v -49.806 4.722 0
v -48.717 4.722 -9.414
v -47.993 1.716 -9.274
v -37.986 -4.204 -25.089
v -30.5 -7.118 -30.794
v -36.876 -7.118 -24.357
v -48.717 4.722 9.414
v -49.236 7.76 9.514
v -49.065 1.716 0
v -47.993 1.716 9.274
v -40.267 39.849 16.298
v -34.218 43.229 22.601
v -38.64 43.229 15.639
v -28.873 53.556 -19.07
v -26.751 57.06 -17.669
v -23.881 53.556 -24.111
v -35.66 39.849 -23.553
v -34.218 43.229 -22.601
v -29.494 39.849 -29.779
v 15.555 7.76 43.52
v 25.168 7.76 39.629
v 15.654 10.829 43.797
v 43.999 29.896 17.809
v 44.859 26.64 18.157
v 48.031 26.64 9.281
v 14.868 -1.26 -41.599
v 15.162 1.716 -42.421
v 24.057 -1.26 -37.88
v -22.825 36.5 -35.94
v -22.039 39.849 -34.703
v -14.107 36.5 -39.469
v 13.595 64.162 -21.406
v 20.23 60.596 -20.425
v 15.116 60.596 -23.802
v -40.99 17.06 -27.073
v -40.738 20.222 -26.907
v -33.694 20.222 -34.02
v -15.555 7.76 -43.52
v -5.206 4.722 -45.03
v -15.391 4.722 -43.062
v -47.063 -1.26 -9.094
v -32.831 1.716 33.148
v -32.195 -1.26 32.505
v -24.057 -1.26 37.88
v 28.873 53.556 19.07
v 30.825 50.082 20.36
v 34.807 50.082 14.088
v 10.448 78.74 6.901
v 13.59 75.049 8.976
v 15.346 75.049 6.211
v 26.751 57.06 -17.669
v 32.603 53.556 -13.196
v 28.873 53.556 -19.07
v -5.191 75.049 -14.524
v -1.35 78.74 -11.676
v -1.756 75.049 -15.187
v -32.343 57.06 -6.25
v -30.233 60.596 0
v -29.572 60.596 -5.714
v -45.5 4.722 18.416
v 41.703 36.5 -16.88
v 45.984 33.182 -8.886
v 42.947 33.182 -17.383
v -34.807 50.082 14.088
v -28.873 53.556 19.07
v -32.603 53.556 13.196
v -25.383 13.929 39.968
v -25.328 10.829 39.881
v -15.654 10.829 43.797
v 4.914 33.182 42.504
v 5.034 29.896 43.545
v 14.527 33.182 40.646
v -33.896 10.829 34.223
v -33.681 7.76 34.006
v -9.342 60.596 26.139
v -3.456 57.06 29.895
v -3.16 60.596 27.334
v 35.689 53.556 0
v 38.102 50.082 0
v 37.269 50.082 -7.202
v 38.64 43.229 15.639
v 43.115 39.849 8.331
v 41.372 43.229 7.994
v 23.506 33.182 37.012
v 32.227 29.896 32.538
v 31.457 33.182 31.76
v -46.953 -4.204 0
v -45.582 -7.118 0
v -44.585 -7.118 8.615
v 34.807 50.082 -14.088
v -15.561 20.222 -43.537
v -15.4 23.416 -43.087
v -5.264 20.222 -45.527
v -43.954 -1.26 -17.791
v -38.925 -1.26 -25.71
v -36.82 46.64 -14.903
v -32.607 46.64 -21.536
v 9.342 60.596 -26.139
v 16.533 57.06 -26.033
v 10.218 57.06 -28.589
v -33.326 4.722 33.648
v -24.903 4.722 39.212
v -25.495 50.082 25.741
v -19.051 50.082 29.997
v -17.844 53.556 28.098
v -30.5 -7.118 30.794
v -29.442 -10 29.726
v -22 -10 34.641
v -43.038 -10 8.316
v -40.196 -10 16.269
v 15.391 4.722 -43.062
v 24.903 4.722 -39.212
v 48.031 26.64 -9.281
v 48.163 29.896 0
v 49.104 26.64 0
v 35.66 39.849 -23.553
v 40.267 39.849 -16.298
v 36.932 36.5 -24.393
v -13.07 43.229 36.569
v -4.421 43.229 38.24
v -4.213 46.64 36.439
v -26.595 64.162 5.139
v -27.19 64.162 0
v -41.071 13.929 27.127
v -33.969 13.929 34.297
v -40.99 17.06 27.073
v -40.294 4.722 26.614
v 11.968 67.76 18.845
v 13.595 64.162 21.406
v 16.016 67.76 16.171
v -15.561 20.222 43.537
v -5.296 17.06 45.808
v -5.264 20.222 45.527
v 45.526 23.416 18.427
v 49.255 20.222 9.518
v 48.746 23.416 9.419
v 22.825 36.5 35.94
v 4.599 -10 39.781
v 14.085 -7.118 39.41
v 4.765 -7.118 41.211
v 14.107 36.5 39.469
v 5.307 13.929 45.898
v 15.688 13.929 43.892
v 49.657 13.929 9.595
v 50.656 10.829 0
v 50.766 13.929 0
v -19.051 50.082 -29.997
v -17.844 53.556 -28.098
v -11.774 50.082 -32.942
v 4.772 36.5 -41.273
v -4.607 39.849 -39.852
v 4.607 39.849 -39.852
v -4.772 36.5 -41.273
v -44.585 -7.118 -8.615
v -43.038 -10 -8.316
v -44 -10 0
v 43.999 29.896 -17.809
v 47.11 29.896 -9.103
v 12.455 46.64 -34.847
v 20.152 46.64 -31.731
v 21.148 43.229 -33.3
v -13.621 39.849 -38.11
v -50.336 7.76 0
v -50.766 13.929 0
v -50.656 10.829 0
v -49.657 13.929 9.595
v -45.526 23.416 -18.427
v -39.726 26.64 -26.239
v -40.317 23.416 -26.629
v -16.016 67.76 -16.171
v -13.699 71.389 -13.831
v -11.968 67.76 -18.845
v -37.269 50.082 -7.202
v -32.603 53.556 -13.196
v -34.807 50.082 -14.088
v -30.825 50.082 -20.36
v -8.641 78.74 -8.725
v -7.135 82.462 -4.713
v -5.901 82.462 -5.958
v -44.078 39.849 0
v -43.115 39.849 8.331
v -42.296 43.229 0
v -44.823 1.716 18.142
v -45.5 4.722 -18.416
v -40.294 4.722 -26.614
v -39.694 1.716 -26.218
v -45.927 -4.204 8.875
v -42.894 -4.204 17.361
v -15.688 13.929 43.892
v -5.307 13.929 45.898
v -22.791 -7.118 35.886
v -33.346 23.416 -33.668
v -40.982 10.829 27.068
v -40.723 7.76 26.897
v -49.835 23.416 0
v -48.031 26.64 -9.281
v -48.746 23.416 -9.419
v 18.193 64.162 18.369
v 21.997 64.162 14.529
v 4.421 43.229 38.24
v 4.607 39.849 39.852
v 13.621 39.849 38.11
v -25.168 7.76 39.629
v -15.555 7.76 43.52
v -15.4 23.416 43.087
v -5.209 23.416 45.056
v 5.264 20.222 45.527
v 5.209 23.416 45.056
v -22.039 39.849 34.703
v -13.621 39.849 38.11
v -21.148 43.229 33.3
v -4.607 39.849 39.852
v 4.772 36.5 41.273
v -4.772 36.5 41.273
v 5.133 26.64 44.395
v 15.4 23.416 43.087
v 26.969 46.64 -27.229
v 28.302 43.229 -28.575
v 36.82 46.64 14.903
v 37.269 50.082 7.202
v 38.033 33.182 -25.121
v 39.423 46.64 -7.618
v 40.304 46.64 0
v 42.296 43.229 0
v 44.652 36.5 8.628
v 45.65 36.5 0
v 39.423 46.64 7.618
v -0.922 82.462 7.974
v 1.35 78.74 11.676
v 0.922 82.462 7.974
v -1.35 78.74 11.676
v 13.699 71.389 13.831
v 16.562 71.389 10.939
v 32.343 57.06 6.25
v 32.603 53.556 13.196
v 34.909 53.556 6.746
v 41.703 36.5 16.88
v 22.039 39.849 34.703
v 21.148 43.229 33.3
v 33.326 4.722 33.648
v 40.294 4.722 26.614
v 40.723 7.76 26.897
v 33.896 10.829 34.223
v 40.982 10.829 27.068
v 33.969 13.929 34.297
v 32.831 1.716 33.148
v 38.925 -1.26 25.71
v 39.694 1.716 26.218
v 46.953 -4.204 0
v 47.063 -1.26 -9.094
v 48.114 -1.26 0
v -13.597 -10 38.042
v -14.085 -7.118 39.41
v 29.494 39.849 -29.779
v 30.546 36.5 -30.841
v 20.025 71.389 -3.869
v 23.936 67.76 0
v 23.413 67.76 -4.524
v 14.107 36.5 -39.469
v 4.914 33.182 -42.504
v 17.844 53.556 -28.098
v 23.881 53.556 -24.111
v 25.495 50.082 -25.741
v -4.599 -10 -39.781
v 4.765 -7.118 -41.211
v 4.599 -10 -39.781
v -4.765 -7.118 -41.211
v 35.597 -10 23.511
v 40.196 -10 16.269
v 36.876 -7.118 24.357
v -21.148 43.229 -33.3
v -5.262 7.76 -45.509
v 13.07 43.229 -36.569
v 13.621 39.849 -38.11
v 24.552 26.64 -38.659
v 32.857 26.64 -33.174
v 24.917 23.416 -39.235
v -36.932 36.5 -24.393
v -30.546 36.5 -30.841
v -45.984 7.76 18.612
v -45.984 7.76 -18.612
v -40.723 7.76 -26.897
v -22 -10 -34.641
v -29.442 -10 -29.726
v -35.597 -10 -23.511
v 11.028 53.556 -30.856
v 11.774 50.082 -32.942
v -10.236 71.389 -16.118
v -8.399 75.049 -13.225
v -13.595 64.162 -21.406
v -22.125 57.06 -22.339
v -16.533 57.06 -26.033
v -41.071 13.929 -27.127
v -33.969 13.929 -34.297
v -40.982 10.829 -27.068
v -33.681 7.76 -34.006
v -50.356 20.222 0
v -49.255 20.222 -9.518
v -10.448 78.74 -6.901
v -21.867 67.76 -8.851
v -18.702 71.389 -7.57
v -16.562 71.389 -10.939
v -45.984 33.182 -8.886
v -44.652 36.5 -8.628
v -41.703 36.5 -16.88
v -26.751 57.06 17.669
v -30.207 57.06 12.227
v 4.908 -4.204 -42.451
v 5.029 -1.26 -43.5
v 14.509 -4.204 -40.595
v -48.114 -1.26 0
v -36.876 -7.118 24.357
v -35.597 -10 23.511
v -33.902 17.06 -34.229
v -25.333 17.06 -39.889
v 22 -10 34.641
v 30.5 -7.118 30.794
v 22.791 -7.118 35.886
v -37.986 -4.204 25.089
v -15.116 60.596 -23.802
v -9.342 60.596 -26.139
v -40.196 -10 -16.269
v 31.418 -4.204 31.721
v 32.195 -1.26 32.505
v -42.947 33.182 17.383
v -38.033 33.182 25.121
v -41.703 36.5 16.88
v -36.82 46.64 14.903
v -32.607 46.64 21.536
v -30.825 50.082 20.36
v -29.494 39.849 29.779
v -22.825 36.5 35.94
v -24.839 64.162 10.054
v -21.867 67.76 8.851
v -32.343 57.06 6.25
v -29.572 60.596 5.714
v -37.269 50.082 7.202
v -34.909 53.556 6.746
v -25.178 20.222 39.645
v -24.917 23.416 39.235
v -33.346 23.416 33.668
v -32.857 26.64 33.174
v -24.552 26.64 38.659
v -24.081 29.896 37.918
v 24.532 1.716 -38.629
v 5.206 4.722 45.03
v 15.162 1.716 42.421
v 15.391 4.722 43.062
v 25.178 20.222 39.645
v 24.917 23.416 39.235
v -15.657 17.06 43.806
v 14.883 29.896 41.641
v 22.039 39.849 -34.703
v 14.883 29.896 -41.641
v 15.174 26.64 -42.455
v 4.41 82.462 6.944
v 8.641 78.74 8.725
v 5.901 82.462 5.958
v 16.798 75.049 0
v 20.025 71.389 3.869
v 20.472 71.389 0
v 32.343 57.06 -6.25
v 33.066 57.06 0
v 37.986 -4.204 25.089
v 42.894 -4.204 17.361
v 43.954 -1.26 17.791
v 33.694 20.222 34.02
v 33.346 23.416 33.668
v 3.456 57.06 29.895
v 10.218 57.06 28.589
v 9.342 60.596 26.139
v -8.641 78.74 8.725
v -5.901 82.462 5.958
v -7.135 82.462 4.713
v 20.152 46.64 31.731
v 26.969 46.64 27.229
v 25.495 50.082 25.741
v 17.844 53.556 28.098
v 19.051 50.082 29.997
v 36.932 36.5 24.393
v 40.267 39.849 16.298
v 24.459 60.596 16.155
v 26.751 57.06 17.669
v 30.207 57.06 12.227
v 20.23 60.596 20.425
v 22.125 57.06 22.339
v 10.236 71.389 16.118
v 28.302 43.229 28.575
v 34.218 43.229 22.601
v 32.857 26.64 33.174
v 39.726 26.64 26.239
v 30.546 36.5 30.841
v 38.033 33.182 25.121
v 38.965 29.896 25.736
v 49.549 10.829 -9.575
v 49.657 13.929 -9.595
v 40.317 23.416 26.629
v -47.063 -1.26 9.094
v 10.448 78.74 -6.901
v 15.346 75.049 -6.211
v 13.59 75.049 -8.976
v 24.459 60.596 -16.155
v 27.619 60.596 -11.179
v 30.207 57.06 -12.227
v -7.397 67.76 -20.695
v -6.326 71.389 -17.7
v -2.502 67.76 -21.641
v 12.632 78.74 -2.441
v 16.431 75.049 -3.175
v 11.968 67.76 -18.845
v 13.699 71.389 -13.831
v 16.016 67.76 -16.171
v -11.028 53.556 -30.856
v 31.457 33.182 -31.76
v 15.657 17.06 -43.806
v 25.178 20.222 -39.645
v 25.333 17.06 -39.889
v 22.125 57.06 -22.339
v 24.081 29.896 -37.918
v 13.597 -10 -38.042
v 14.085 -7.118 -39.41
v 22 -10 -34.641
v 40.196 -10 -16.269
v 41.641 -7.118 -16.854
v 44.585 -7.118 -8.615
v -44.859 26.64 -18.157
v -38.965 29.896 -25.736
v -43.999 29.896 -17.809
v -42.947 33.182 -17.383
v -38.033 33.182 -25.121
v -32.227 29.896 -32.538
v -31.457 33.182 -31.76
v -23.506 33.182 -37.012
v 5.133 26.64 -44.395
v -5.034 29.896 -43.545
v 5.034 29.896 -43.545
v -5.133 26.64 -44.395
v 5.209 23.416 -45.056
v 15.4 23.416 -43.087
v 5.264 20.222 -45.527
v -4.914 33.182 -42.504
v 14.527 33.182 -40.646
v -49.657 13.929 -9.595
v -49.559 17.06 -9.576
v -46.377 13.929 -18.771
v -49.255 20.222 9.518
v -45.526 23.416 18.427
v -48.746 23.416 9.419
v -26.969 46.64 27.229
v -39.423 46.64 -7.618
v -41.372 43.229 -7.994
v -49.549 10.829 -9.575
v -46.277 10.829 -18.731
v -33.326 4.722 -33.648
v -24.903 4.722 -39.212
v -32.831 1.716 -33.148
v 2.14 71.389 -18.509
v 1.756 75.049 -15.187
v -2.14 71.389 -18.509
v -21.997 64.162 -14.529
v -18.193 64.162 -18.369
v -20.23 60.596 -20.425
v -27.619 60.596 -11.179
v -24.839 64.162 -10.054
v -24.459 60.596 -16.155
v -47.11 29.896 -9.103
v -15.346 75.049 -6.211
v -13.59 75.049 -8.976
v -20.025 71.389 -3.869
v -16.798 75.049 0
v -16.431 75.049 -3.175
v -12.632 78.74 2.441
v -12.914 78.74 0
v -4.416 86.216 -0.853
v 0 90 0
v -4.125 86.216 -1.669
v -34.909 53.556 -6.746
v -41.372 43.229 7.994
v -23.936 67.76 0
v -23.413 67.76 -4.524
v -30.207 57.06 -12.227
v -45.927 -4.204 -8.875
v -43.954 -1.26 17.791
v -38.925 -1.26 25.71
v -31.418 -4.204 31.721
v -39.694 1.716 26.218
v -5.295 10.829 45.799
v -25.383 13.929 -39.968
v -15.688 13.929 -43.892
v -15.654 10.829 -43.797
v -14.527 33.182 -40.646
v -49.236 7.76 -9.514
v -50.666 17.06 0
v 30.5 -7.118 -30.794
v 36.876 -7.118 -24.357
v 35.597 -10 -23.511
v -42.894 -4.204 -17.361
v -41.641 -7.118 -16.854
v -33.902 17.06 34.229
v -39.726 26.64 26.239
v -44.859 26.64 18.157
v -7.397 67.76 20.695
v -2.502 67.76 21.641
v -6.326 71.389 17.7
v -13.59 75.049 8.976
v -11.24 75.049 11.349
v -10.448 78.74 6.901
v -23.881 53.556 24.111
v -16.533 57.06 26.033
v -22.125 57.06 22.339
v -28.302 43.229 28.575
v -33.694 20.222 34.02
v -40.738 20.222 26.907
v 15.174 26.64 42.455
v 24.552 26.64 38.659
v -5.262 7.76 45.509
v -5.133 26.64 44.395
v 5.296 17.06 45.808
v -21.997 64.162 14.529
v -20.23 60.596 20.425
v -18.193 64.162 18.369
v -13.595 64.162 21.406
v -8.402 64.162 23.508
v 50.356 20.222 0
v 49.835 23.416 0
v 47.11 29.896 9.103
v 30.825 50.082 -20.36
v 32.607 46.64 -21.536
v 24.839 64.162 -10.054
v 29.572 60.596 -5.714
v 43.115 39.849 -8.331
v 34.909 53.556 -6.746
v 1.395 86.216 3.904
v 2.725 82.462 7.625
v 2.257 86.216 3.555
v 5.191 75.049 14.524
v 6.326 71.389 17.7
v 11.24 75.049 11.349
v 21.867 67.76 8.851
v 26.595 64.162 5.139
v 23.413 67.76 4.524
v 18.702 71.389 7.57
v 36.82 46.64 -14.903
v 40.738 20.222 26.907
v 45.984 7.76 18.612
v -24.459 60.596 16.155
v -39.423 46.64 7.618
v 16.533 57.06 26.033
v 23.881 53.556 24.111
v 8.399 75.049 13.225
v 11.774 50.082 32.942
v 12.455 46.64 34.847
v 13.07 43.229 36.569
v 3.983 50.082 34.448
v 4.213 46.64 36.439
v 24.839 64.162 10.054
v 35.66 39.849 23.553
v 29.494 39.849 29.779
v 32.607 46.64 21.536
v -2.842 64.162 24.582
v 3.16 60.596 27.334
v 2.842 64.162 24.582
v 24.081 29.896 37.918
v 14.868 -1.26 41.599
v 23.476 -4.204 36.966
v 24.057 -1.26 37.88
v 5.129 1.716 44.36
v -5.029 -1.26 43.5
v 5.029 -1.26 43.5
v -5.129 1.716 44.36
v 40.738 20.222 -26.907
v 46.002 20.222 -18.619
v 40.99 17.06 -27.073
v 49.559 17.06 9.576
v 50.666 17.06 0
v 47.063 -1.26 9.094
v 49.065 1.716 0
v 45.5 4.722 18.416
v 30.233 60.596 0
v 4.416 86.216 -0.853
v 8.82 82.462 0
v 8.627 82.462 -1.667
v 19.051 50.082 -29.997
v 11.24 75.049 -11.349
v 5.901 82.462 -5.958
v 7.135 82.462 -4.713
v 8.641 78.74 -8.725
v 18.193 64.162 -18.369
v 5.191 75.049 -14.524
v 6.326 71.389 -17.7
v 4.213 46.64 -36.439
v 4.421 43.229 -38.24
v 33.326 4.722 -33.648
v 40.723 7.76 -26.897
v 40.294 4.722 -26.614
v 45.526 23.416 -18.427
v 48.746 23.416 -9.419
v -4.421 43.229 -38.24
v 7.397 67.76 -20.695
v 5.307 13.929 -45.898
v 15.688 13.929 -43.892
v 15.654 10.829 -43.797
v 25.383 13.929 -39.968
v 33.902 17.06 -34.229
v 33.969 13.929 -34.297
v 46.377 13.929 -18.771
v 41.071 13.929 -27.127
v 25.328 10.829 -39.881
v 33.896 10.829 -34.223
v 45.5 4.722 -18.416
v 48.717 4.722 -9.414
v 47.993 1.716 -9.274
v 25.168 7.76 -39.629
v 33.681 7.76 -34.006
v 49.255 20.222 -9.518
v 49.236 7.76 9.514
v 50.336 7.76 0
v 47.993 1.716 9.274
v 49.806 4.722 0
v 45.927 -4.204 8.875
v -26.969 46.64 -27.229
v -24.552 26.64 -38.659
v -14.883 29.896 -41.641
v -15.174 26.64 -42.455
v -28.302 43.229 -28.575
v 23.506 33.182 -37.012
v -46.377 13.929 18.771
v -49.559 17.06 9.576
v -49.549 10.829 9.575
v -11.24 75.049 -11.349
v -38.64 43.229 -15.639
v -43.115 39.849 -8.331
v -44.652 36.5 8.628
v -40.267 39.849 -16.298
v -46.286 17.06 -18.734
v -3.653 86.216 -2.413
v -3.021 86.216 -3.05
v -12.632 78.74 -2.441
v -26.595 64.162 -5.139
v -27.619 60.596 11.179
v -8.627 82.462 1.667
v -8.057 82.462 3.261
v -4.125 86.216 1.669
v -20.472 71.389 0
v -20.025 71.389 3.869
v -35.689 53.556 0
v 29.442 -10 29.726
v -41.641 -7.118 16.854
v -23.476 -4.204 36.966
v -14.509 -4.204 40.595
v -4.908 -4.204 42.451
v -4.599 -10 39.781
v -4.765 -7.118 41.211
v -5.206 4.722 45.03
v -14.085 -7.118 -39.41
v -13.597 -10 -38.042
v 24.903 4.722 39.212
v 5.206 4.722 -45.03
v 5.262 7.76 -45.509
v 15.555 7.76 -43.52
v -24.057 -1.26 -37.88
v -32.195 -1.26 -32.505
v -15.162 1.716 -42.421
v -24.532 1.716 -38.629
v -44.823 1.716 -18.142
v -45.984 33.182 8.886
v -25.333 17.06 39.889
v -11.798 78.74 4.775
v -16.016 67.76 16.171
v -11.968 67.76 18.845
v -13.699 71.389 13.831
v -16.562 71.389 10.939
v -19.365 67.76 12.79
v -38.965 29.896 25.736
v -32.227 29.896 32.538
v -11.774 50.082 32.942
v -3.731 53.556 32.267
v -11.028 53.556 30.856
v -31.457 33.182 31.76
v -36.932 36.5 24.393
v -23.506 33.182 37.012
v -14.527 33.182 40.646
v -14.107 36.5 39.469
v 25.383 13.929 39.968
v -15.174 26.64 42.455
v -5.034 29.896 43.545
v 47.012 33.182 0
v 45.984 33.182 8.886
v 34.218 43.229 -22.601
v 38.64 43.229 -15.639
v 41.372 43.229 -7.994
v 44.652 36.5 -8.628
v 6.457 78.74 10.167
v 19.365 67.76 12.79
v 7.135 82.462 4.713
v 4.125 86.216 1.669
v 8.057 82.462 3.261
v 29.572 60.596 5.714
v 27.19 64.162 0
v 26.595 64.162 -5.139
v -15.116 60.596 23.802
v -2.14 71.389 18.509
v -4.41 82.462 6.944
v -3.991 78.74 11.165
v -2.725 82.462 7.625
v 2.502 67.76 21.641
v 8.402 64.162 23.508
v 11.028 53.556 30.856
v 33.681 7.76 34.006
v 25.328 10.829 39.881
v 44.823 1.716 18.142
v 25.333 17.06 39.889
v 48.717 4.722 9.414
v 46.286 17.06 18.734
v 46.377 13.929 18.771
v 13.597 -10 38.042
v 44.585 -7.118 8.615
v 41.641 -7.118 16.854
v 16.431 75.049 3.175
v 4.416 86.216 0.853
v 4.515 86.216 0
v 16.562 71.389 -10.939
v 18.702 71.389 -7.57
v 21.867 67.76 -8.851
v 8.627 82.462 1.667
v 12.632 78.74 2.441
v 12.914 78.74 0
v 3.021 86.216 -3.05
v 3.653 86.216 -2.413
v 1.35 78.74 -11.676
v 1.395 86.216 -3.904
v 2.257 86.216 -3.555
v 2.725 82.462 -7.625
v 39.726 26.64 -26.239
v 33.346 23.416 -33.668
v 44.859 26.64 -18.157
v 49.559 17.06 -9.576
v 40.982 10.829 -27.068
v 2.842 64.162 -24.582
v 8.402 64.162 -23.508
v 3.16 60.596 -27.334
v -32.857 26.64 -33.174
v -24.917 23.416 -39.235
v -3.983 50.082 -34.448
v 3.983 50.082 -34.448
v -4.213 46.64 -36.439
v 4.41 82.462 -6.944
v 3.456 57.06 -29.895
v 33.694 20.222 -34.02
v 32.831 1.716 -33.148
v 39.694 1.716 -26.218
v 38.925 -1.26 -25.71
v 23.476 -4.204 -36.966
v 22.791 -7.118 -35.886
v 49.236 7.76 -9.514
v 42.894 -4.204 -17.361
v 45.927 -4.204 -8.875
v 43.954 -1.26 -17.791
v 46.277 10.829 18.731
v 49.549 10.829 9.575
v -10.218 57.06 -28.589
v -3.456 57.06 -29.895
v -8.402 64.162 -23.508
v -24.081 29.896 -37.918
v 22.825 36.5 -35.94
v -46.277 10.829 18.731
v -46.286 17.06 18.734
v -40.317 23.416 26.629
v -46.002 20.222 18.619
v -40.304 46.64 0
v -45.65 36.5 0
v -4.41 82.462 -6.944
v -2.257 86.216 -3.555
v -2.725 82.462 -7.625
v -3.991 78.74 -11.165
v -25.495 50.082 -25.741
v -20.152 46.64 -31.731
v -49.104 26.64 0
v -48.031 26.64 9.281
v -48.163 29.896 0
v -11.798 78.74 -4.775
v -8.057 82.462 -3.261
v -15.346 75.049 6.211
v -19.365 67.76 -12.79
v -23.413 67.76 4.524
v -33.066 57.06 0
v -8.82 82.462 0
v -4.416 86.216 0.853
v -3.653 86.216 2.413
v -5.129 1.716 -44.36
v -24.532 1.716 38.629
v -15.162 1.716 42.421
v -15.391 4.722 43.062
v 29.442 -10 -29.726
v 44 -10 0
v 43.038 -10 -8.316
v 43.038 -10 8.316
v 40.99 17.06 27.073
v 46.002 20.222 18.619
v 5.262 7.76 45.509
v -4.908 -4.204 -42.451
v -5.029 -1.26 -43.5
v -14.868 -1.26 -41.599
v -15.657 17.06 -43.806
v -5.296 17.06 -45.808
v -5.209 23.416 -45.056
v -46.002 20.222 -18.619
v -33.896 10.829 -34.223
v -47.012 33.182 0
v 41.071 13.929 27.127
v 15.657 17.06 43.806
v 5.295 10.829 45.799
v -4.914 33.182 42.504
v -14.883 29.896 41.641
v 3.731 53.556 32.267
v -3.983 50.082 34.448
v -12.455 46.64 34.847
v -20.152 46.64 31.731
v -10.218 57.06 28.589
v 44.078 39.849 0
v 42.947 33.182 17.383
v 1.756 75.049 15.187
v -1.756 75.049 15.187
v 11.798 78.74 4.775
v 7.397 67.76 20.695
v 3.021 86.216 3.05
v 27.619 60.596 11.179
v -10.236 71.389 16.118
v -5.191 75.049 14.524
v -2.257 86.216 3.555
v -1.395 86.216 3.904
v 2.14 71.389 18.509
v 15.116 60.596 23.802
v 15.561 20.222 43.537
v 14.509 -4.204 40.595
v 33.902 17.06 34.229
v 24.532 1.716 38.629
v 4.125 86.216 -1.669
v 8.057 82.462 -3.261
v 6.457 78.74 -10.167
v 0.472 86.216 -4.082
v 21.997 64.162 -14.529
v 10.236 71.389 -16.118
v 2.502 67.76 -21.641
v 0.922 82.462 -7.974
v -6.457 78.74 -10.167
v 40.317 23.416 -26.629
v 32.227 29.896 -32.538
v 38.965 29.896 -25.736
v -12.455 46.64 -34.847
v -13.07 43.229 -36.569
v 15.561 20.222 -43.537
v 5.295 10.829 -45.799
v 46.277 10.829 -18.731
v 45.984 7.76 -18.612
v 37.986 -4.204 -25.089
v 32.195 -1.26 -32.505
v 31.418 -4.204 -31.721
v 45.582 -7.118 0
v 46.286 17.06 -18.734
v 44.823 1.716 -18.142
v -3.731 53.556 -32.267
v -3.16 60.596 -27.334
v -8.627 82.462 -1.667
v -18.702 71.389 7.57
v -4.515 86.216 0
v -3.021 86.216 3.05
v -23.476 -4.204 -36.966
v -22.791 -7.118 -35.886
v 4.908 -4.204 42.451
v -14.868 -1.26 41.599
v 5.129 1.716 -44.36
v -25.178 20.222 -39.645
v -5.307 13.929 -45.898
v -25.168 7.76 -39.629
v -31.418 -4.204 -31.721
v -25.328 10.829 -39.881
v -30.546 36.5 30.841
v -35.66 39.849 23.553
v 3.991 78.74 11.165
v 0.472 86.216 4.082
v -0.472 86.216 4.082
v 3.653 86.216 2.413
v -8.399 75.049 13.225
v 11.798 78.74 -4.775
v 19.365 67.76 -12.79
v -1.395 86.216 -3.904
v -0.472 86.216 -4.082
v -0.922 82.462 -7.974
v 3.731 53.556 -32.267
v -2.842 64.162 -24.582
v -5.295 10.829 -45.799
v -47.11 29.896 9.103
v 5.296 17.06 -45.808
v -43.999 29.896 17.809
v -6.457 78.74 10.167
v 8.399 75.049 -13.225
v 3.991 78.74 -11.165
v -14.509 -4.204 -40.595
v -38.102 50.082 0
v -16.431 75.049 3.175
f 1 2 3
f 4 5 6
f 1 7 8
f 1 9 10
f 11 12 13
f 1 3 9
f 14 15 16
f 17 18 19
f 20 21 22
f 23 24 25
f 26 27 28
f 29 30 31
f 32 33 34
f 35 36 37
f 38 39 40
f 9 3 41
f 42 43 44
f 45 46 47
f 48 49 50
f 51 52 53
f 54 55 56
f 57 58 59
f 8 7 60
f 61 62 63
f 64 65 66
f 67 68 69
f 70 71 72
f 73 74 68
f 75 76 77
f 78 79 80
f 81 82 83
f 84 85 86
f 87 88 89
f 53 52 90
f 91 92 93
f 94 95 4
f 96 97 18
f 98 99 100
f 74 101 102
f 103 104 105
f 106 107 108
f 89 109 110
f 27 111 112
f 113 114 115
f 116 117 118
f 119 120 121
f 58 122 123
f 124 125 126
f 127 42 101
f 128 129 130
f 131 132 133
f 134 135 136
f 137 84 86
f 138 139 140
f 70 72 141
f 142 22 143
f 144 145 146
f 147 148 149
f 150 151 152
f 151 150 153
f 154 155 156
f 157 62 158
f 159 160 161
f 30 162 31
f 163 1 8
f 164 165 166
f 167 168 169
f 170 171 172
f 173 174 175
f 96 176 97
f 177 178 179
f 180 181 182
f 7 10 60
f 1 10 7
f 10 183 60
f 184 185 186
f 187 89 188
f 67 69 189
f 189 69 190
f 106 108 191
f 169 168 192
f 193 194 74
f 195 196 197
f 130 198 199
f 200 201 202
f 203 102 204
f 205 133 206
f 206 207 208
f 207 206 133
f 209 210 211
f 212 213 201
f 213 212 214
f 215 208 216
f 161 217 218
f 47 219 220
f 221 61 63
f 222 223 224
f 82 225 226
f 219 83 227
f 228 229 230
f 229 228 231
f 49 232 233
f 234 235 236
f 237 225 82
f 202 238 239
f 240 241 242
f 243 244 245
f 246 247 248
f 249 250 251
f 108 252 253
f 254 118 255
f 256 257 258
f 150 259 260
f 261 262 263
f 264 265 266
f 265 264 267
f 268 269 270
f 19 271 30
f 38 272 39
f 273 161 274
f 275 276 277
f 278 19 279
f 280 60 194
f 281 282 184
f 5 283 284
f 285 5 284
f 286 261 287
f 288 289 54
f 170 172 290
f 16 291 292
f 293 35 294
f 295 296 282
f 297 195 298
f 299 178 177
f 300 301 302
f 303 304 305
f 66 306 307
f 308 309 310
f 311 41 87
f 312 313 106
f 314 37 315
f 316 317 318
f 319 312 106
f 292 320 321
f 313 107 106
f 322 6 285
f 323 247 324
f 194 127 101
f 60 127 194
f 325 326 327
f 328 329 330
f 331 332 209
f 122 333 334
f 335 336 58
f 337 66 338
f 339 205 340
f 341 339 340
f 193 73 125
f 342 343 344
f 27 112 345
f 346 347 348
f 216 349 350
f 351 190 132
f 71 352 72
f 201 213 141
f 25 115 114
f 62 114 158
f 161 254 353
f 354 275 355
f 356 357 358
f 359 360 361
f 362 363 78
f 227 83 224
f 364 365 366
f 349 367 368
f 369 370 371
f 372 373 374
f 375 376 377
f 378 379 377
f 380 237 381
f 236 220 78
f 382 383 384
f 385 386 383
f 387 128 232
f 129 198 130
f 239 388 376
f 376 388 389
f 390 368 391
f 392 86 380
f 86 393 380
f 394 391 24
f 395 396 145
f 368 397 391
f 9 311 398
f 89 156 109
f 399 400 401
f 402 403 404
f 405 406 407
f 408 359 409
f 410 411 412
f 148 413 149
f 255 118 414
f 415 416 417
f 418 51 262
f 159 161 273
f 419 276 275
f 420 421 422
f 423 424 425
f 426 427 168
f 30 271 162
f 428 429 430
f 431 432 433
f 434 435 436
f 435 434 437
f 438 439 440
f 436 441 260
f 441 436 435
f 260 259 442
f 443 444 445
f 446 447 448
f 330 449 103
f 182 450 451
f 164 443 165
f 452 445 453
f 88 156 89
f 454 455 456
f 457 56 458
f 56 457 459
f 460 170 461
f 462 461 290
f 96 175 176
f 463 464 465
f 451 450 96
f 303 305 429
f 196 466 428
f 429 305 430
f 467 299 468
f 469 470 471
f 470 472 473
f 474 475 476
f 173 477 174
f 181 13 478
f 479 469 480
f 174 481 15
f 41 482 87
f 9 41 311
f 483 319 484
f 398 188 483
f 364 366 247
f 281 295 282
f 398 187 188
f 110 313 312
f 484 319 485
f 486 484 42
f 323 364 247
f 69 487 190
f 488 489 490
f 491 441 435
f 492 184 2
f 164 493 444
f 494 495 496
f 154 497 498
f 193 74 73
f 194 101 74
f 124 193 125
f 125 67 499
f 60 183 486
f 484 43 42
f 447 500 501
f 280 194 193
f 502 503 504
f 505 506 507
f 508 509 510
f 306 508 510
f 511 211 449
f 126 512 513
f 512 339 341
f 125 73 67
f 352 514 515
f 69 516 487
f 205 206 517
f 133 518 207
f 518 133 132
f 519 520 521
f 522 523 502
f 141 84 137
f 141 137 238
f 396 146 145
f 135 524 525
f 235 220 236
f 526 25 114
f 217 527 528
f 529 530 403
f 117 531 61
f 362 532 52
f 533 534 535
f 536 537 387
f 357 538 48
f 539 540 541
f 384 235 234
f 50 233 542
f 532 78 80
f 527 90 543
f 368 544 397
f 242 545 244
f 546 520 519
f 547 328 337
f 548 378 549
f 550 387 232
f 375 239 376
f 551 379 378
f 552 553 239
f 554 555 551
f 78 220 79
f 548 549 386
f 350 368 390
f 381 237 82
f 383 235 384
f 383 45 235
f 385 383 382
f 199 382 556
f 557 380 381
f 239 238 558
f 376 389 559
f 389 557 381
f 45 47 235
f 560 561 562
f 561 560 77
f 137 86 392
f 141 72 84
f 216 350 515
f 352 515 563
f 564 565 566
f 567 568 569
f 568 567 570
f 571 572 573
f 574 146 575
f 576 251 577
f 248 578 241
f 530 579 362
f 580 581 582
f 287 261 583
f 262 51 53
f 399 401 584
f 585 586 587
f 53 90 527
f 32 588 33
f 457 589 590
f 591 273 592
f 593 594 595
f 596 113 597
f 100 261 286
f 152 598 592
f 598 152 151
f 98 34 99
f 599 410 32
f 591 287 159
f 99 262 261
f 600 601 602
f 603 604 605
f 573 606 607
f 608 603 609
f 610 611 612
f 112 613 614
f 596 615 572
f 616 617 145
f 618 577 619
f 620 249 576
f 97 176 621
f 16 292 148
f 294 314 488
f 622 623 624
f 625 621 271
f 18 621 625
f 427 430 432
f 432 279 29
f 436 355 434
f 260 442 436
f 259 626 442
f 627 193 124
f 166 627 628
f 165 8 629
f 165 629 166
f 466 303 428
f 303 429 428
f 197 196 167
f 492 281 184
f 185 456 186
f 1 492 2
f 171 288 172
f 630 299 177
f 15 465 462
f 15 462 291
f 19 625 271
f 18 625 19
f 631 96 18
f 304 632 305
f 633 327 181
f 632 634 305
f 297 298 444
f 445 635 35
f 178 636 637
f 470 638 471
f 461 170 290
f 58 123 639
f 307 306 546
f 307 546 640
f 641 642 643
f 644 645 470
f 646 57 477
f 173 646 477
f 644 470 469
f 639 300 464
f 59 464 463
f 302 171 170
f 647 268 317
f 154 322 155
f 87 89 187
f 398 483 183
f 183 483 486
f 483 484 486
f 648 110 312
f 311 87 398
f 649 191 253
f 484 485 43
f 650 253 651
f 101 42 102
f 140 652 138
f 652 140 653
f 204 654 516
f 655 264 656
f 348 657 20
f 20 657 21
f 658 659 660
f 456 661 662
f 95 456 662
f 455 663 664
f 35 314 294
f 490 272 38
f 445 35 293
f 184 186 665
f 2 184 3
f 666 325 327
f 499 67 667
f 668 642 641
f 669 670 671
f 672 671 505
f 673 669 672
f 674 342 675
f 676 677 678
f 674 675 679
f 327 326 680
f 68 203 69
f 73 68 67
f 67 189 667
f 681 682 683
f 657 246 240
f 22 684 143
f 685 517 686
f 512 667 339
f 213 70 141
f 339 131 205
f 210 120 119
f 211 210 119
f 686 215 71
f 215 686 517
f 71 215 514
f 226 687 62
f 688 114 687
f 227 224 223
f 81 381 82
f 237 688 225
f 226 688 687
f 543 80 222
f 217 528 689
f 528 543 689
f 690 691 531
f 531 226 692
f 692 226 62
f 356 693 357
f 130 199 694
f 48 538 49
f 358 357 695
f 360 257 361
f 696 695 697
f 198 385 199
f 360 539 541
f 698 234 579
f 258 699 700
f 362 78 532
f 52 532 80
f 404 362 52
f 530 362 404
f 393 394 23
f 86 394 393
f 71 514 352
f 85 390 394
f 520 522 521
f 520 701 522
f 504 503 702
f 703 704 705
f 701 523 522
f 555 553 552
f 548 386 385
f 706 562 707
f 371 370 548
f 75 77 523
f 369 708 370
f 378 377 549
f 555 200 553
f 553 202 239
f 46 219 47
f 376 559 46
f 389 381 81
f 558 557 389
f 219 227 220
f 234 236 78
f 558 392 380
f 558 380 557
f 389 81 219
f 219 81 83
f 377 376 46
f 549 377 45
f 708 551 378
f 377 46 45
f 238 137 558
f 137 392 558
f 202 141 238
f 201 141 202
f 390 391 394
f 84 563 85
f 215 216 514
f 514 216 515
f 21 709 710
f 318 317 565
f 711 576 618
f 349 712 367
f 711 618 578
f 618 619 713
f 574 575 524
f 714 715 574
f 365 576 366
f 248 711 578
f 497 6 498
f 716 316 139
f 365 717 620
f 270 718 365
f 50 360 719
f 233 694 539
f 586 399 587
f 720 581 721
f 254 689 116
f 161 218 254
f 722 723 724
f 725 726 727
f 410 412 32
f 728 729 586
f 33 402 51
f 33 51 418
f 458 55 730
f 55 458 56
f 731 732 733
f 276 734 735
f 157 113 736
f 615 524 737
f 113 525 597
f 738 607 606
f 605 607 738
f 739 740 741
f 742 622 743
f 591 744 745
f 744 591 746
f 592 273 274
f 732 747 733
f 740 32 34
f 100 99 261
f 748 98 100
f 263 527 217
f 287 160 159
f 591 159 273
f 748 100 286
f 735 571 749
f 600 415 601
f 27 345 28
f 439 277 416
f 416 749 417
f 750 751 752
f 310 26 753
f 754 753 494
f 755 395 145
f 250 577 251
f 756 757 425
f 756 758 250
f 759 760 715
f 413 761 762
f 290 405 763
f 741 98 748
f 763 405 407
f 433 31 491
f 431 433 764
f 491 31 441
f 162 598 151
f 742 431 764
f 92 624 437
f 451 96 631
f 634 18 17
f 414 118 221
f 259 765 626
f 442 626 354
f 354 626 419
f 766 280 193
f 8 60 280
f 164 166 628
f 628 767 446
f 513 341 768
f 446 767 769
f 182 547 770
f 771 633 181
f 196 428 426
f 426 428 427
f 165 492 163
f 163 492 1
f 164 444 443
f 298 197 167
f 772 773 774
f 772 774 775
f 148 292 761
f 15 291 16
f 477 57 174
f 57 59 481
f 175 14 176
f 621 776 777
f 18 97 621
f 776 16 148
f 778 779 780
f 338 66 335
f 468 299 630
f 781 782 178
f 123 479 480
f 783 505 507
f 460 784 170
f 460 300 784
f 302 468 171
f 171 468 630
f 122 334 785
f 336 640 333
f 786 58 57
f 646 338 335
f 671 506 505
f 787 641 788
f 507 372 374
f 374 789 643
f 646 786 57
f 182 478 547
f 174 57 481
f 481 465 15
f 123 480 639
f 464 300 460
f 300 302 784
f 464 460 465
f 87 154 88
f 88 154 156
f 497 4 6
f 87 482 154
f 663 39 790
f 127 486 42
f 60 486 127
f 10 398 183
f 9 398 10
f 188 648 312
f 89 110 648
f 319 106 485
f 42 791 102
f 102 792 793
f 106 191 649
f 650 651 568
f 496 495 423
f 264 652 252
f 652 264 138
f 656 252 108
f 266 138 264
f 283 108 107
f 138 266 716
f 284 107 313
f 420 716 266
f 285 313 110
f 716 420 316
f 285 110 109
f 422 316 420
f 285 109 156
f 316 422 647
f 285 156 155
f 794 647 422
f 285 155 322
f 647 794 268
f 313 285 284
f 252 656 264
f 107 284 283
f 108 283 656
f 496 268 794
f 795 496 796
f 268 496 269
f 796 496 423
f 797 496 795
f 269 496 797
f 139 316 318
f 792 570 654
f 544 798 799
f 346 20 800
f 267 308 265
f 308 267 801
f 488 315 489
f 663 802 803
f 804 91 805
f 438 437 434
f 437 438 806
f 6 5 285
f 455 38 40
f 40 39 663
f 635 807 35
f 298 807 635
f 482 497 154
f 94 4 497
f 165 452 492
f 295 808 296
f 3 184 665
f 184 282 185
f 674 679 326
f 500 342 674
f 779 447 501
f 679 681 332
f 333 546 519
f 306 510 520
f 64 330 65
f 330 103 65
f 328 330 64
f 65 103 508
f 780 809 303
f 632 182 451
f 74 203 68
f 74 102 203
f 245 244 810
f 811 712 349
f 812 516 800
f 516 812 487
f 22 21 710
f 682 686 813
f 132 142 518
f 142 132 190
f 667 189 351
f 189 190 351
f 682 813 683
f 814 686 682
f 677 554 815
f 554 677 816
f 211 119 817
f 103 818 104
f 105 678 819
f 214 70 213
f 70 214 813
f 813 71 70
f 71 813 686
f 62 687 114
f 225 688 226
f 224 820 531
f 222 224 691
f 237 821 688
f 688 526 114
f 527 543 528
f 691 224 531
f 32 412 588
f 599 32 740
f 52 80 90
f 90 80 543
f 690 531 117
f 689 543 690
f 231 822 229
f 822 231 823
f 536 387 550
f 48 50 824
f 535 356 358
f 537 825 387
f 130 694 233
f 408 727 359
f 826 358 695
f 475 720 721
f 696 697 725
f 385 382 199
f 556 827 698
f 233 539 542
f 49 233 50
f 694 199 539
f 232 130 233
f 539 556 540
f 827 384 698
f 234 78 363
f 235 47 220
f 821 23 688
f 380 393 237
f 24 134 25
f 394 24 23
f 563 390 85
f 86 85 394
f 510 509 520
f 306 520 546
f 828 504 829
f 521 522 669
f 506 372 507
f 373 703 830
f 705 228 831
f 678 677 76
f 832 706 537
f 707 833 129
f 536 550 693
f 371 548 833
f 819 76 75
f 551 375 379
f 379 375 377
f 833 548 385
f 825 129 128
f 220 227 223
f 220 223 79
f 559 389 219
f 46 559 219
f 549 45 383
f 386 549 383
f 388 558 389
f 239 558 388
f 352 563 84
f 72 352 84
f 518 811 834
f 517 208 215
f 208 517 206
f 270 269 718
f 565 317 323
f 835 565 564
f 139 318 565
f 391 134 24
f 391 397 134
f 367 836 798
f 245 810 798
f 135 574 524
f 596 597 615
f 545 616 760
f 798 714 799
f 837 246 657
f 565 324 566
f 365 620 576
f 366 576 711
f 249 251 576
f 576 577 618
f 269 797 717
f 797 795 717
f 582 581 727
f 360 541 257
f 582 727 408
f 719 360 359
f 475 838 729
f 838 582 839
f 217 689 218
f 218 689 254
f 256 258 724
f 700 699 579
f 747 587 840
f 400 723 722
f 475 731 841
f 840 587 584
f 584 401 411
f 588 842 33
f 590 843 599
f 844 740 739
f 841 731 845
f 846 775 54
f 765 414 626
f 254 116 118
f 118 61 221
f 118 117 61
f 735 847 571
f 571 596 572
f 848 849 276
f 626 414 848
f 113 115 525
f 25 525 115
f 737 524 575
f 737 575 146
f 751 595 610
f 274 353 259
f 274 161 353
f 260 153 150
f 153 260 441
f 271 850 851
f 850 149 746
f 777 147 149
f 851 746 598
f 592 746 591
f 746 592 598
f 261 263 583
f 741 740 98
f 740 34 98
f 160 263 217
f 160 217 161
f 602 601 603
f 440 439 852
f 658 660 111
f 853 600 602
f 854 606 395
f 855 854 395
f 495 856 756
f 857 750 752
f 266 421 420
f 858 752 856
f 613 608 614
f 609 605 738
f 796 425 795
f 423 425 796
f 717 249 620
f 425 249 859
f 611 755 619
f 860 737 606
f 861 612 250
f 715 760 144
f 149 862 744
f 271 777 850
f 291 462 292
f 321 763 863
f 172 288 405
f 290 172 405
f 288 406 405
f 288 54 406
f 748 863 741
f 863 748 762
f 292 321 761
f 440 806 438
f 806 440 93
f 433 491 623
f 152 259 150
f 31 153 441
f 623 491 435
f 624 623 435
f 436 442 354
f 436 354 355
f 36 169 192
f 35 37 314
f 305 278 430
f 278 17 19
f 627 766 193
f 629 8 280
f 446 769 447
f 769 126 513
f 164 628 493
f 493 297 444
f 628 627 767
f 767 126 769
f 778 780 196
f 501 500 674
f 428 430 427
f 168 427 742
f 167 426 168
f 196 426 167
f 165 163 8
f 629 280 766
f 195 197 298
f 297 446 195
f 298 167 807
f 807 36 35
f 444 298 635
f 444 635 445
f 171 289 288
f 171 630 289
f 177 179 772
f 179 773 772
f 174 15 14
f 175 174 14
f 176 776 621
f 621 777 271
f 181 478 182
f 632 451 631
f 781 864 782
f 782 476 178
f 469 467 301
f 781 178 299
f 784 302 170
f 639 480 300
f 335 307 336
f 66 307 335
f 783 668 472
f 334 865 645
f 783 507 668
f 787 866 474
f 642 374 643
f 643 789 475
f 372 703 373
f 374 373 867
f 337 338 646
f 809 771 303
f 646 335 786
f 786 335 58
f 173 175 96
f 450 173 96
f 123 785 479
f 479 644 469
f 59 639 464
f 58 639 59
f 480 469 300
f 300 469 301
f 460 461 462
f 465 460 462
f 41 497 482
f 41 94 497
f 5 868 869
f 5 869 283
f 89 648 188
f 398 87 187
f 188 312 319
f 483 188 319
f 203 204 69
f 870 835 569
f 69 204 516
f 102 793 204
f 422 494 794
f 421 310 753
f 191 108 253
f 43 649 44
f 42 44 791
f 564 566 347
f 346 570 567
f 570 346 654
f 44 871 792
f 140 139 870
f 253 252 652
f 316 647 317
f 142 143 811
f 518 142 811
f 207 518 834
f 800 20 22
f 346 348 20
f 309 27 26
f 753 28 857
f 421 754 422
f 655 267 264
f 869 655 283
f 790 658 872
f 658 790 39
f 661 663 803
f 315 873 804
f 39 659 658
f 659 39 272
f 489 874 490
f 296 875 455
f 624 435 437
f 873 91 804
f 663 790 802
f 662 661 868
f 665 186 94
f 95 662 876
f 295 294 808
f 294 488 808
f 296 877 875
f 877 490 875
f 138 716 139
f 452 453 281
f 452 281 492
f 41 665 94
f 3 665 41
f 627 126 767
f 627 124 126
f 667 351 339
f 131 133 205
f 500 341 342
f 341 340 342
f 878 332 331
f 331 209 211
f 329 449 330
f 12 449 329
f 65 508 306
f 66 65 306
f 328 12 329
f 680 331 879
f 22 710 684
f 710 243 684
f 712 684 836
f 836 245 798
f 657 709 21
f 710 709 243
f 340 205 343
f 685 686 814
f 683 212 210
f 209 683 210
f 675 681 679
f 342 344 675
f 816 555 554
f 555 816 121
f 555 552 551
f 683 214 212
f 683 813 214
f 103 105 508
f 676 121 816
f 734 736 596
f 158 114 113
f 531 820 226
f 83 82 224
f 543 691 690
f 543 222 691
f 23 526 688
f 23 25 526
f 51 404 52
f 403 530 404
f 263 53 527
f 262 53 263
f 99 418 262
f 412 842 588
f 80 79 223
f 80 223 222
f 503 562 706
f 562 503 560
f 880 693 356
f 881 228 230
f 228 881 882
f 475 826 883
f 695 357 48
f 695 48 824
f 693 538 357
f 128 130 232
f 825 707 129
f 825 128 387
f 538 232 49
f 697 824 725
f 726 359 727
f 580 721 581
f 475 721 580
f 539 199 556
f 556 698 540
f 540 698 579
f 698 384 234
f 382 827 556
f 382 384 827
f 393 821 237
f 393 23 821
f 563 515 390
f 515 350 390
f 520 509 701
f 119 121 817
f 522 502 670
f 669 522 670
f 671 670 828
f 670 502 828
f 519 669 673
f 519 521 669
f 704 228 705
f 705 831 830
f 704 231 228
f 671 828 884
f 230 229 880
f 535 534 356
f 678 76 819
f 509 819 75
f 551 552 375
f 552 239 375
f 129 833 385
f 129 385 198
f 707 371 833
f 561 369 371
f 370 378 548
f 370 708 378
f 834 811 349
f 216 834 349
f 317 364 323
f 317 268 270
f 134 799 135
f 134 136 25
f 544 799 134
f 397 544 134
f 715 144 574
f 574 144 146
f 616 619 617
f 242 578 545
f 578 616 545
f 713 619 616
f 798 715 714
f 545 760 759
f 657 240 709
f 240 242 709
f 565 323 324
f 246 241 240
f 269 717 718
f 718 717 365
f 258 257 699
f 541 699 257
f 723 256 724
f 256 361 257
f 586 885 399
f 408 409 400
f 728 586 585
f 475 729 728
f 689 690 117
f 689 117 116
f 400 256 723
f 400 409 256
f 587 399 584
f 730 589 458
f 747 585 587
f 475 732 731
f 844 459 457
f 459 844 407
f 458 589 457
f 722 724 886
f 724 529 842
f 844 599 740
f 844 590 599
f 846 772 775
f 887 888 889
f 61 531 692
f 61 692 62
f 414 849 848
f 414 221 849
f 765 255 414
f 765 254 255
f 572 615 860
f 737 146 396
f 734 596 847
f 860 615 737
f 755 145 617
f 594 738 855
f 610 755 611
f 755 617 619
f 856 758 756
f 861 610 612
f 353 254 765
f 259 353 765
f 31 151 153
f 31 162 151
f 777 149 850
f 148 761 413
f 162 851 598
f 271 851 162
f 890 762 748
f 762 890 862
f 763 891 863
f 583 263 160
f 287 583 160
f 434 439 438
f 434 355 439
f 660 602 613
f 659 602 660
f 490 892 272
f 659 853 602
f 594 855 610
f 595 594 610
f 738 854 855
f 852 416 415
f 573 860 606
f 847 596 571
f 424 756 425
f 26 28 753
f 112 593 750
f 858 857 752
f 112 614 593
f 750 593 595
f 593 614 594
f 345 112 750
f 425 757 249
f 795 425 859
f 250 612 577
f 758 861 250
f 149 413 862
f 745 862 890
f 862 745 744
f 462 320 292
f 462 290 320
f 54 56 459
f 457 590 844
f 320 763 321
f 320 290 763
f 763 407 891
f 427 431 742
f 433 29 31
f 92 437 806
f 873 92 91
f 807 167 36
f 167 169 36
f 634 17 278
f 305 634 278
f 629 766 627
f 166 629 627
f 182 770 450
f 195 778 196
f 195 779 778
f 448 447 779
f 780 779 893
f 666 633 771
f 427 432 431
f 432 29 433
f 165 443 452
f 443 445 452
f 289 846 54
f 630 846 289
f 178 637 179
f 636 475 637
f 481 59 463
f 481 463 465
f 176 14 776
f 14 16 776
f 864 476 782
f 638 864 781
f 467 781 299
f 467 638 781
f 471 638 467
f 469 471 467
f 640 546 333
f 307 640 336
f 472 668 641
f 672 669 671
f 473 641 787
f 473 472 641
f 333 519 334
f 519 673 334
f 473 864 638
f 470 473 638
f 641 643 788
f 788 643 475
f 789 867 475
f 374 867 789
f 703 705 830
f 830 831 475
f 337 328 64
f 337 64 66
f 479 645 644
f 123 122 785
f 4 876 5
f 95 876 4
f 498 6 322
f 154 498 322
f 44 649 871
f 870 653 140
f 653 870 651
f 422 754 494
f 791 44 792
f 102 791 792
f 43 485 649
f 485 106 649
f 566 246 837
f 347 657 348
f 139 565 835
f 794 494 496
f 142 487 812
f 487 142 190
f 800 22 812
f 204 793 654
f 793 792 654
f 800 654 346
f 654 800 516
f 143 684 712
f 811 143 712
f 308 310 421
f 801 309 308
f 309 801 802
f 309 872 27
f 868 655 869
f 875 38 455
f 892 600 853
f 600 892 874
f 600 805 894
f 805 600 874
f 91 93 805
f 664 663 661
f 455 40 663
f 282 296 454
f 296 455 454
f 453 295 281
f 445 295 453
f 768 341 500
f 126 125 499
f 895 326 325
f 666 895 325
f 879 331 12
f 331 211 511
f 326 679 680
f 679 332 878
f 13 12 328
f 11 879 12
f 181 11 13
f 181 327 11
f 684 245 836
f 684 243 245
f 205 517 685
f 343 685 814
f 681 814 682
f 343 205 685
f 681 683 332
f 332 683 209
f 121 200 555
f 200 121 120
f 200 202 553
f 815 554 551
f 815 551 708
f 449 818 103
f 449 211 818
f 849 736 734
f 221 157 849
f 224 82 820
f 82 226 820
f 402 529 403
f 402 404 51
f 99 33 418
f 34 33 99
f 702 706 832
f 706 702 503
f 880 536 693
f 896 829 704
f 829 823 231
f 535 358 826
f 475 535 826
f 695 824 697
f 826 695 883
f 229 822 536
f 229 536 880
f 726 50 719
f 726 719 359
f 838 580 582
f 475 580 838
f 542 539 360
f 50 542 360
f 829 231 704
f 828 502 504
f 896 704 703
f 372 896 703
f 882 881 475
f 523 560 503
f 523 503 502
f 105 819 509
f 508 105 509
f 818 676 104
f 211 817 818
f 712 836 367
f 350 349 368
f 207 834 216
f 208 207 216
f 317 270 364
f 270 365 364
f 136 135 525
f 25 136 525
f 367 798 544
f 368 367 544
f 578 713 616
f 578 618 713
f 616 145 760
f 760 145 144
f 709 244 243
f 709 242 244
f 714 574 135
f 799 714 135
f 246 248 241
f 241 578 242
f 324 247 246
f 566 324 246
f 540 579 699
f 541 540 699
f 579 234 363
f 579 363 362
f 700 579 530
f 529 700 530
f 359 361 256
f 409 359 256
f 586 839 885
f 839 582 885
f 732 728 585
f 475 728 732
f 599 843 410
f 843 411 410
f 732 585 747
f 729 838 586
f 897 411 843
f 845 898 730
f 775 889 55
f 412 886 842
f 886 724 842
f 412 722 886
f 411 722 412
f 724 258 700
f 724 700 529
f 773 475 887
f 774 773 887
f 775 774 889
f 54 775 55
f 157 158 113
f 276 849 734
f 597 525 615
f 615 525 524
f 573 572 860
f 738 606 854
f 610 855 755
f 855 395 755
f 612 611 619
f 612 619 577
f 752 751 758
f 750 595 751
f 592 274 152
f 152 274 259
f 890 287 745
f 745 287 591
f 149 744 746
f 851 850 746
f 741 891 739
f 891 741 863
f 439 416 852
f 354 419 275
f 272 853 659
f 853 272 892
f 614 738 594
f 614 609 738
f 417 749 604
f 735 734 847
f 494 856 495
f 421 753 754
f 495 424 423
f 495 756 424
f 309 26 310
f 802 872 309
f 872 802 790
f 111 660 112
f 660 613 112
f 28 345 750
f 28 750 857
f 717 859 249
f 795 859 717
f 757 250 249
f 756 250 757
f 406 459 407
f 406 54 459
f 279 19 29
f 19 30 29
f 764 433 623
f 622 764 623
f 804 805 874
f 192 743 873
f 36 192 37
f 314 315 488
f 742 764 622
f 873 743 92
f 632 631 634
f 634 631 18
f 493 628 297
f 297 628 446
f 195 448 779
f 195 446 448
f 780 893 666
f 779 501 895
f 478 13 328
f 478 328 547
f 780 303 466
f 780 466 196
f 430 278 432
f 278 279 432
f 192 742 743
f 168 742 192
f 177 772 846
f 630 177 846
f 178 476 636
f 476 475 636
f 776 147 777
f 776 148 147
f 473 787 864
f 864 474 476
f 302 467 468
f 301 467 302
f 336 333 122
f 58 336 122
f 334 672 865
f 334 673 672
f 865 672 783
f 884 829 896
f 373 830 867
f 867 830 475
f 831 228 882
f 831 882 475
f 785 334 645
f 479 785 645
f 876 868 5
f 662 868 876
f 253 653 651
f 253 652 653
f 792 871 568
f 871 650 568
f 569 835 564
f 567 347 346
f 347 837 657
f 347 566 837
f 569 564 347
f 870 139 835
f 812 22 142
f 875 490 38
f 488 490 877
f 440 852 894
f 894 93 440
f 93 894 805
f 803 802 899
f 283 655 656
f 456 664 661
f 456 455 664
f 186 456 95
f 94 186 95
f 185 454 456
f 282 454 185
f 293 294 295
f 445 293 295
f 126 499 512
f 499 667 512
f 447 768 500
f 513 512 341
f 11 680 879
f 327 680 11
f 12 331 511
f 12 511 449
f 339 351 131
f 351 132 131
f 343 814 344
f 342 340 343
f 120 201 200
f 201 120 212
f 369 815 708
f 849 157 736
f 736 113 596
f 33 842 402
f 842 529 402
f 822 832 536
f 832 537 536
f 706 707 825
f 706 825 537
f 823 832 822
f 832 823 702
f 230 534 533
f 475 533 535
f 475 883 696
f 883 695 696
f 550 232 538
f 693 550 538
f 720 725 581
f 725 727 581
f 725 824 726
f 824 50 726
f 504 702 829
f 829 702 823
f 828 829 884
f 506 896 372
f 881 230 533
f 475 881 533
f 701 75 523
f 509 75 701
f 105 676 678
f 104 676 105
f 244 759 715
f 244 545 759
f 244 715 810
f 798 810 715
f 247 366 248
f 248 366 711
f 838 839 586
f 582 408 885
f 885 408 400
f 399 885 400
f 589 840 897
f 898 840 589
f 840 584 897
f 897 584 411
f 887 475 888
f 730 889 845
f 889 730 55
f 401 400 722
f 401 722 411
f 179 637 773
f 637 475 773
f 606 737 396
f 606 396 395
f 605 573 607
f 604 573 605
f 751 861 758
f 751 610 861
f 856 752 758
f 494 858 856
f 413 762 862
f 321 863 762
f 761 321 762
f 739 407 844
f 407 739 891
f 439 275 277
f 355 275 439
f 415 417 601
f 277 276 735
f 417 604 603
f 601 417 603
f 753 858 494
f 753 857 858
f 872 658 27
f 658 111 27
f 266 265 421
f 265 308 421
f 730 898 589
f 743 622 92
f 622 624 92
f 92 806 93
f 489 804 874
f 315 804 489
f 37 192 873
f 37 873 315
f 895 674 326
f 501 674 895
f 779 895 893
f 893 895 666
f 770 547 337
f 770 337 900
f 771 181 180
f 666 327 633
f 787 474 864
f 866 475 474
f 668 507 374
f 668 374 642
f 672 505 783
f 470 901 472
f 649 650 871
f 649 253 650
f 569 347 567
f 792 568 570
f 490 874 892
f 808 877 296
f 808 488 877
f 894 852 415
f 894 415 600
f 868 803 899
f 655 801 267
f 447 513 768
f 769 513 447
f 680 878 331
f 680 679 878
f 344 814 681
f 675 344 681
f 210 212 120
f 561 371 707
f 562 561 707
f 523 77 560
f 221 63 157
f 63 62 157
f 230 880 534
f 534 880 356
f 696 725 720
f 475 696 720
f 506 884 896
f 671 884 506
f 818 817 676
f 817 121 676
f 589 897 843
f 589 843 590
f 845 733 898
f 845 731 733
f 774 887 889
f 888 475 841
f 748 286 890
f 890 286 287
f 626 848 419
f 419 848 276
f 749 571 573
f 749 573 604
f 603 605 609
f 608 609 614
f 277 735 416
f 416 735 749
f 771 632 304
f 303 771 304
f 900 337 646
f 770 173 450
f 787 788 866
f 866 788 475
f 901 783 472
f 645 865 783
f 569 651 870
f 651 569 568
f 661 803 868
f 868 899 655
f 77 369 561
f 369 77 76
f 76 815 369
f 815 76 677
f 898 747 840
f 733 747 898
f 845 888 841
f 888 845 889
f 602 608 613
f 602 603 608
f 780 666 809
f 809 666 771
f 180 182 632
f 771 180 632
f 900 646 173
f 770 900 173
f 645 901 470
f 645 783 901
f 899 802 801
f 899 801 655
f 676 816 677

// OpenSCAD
difference () {
  union () {
    difference () {
      difference () {
        scale ([1.1, 1, 1]) {
          translate ([0, -10, 0]) {
            rotate (a=90.0, v=[-1, 0, 0]) {
              rotate_extrude ($fn=30) {
                difference () {
                  polygon (points=[[0, 0], [40, 0], [63, 43], [0, 100], [0, 100]]);
                  polygon (points=[[40, 0], [18647/450, 1297/450], [63, 43]]);
                  polygon (points=[[18647/450, 1297/450], [9604/225, 1304/225], [63, 43]]);
                  polygon (points=[[9604/225, 1304/225], [2187/50, 437/50], [63, 43]]);
                  polygon (points=[[2187/50, 437/50], [10036/225, 2636/225], [63, 43]]);
                  polygon (points=[[10036/225, 2636/225], [815/18, 265/18], [63, 43]]);
                  polygon (points=[[815/18, 265/18], [1144/25, 444/25], [63, 43]]);
                  polygon (points=[[1144/25, 444/25], [20723/450, 9373/450], [63, 43]]);
                  polygon (points=[[20723/450, 9373/450], [10384/225, 5384/225], [63, 43]]);
                  polygon (points=[[10384/225, 5384/225], [2303/50, 1353/50], [63, 43]]);
                  polygon (points=[[2303/50, 1353/50], [412/9, 272/9], [63, 43]]);
                  polygon (points=[[412/9, 272/9], [20387/450, 15037/450], [63, 43]]);
                  polygon (points=[[20387/450, 15037/450], [1116/25, 916/25], [63, 43]]);
                  polygon (points=[[1116/25, 916/25], [19703/450, 17953/450], [63, 43]]);
                  polygon (points=[[19703/450, 17953/450], [9616/225, 9716/225], [63, 43]]);
                  polygon (points=[[9616/225, 9716/225], [83/2, 93/2], [63, 43]]);
                  polygon (points=[[83/2, 93/2], [9016/225, 11216/225], [63, 43]]);
                  polygon (points=[[9016/225, 11216/225], [17303/450, 23953/450], [63, 43]]);
                  polygon (points=[[17303/450, 23953/450], [916/25, 1416/25], [63, 43]]);
                  polygon (points=[[916/25, 1416/25], [15587/450, 27037/450], [63, 43]]);
                  polygon (points=[[15587/450, 27037/450], [292/9, 572/9], [63, 43]]);
                  polygon (points=[[292/9, 572/9], [1503/50, 3353/50], [63, 43]]);
                  polygon (points=[[1503/50, 3353/50], [6184/225, 15884/225], [63, 43]]);
                  polygon (points=[[6184/225, 15884/225], [11123/450, 33373/450], [63, 43]]);
                  polygon (points=[[11123/450, 33373/450], [544/25, 1944/25], [63, 43]]);
                  polygon (points=[[544/25, 1944/25], [335/18, 1465/18], [63, 43]]);
                  polygon (points=[[335/18, 1465/18], [3436/225, 19136/225], [63, 43]]);
                  polygon (points=[[3436/225, 19136/225], [587/50, 4437/50], [63, 43]]);
                  polygon (points=[[587/50, 4437/50], [1804/225, 20804/225], [63, 43]]);
                  polygon (points=[[1804/225, 20804/225], [1847/450, 43297/450], [63, 43]]);
                  polygon (points=[[1847/450, 43297/450], [0, 100], [63, 43]]);
                }
              }
            }
          }
        }
      }
    }
  }
  sphere (r=0);
}
